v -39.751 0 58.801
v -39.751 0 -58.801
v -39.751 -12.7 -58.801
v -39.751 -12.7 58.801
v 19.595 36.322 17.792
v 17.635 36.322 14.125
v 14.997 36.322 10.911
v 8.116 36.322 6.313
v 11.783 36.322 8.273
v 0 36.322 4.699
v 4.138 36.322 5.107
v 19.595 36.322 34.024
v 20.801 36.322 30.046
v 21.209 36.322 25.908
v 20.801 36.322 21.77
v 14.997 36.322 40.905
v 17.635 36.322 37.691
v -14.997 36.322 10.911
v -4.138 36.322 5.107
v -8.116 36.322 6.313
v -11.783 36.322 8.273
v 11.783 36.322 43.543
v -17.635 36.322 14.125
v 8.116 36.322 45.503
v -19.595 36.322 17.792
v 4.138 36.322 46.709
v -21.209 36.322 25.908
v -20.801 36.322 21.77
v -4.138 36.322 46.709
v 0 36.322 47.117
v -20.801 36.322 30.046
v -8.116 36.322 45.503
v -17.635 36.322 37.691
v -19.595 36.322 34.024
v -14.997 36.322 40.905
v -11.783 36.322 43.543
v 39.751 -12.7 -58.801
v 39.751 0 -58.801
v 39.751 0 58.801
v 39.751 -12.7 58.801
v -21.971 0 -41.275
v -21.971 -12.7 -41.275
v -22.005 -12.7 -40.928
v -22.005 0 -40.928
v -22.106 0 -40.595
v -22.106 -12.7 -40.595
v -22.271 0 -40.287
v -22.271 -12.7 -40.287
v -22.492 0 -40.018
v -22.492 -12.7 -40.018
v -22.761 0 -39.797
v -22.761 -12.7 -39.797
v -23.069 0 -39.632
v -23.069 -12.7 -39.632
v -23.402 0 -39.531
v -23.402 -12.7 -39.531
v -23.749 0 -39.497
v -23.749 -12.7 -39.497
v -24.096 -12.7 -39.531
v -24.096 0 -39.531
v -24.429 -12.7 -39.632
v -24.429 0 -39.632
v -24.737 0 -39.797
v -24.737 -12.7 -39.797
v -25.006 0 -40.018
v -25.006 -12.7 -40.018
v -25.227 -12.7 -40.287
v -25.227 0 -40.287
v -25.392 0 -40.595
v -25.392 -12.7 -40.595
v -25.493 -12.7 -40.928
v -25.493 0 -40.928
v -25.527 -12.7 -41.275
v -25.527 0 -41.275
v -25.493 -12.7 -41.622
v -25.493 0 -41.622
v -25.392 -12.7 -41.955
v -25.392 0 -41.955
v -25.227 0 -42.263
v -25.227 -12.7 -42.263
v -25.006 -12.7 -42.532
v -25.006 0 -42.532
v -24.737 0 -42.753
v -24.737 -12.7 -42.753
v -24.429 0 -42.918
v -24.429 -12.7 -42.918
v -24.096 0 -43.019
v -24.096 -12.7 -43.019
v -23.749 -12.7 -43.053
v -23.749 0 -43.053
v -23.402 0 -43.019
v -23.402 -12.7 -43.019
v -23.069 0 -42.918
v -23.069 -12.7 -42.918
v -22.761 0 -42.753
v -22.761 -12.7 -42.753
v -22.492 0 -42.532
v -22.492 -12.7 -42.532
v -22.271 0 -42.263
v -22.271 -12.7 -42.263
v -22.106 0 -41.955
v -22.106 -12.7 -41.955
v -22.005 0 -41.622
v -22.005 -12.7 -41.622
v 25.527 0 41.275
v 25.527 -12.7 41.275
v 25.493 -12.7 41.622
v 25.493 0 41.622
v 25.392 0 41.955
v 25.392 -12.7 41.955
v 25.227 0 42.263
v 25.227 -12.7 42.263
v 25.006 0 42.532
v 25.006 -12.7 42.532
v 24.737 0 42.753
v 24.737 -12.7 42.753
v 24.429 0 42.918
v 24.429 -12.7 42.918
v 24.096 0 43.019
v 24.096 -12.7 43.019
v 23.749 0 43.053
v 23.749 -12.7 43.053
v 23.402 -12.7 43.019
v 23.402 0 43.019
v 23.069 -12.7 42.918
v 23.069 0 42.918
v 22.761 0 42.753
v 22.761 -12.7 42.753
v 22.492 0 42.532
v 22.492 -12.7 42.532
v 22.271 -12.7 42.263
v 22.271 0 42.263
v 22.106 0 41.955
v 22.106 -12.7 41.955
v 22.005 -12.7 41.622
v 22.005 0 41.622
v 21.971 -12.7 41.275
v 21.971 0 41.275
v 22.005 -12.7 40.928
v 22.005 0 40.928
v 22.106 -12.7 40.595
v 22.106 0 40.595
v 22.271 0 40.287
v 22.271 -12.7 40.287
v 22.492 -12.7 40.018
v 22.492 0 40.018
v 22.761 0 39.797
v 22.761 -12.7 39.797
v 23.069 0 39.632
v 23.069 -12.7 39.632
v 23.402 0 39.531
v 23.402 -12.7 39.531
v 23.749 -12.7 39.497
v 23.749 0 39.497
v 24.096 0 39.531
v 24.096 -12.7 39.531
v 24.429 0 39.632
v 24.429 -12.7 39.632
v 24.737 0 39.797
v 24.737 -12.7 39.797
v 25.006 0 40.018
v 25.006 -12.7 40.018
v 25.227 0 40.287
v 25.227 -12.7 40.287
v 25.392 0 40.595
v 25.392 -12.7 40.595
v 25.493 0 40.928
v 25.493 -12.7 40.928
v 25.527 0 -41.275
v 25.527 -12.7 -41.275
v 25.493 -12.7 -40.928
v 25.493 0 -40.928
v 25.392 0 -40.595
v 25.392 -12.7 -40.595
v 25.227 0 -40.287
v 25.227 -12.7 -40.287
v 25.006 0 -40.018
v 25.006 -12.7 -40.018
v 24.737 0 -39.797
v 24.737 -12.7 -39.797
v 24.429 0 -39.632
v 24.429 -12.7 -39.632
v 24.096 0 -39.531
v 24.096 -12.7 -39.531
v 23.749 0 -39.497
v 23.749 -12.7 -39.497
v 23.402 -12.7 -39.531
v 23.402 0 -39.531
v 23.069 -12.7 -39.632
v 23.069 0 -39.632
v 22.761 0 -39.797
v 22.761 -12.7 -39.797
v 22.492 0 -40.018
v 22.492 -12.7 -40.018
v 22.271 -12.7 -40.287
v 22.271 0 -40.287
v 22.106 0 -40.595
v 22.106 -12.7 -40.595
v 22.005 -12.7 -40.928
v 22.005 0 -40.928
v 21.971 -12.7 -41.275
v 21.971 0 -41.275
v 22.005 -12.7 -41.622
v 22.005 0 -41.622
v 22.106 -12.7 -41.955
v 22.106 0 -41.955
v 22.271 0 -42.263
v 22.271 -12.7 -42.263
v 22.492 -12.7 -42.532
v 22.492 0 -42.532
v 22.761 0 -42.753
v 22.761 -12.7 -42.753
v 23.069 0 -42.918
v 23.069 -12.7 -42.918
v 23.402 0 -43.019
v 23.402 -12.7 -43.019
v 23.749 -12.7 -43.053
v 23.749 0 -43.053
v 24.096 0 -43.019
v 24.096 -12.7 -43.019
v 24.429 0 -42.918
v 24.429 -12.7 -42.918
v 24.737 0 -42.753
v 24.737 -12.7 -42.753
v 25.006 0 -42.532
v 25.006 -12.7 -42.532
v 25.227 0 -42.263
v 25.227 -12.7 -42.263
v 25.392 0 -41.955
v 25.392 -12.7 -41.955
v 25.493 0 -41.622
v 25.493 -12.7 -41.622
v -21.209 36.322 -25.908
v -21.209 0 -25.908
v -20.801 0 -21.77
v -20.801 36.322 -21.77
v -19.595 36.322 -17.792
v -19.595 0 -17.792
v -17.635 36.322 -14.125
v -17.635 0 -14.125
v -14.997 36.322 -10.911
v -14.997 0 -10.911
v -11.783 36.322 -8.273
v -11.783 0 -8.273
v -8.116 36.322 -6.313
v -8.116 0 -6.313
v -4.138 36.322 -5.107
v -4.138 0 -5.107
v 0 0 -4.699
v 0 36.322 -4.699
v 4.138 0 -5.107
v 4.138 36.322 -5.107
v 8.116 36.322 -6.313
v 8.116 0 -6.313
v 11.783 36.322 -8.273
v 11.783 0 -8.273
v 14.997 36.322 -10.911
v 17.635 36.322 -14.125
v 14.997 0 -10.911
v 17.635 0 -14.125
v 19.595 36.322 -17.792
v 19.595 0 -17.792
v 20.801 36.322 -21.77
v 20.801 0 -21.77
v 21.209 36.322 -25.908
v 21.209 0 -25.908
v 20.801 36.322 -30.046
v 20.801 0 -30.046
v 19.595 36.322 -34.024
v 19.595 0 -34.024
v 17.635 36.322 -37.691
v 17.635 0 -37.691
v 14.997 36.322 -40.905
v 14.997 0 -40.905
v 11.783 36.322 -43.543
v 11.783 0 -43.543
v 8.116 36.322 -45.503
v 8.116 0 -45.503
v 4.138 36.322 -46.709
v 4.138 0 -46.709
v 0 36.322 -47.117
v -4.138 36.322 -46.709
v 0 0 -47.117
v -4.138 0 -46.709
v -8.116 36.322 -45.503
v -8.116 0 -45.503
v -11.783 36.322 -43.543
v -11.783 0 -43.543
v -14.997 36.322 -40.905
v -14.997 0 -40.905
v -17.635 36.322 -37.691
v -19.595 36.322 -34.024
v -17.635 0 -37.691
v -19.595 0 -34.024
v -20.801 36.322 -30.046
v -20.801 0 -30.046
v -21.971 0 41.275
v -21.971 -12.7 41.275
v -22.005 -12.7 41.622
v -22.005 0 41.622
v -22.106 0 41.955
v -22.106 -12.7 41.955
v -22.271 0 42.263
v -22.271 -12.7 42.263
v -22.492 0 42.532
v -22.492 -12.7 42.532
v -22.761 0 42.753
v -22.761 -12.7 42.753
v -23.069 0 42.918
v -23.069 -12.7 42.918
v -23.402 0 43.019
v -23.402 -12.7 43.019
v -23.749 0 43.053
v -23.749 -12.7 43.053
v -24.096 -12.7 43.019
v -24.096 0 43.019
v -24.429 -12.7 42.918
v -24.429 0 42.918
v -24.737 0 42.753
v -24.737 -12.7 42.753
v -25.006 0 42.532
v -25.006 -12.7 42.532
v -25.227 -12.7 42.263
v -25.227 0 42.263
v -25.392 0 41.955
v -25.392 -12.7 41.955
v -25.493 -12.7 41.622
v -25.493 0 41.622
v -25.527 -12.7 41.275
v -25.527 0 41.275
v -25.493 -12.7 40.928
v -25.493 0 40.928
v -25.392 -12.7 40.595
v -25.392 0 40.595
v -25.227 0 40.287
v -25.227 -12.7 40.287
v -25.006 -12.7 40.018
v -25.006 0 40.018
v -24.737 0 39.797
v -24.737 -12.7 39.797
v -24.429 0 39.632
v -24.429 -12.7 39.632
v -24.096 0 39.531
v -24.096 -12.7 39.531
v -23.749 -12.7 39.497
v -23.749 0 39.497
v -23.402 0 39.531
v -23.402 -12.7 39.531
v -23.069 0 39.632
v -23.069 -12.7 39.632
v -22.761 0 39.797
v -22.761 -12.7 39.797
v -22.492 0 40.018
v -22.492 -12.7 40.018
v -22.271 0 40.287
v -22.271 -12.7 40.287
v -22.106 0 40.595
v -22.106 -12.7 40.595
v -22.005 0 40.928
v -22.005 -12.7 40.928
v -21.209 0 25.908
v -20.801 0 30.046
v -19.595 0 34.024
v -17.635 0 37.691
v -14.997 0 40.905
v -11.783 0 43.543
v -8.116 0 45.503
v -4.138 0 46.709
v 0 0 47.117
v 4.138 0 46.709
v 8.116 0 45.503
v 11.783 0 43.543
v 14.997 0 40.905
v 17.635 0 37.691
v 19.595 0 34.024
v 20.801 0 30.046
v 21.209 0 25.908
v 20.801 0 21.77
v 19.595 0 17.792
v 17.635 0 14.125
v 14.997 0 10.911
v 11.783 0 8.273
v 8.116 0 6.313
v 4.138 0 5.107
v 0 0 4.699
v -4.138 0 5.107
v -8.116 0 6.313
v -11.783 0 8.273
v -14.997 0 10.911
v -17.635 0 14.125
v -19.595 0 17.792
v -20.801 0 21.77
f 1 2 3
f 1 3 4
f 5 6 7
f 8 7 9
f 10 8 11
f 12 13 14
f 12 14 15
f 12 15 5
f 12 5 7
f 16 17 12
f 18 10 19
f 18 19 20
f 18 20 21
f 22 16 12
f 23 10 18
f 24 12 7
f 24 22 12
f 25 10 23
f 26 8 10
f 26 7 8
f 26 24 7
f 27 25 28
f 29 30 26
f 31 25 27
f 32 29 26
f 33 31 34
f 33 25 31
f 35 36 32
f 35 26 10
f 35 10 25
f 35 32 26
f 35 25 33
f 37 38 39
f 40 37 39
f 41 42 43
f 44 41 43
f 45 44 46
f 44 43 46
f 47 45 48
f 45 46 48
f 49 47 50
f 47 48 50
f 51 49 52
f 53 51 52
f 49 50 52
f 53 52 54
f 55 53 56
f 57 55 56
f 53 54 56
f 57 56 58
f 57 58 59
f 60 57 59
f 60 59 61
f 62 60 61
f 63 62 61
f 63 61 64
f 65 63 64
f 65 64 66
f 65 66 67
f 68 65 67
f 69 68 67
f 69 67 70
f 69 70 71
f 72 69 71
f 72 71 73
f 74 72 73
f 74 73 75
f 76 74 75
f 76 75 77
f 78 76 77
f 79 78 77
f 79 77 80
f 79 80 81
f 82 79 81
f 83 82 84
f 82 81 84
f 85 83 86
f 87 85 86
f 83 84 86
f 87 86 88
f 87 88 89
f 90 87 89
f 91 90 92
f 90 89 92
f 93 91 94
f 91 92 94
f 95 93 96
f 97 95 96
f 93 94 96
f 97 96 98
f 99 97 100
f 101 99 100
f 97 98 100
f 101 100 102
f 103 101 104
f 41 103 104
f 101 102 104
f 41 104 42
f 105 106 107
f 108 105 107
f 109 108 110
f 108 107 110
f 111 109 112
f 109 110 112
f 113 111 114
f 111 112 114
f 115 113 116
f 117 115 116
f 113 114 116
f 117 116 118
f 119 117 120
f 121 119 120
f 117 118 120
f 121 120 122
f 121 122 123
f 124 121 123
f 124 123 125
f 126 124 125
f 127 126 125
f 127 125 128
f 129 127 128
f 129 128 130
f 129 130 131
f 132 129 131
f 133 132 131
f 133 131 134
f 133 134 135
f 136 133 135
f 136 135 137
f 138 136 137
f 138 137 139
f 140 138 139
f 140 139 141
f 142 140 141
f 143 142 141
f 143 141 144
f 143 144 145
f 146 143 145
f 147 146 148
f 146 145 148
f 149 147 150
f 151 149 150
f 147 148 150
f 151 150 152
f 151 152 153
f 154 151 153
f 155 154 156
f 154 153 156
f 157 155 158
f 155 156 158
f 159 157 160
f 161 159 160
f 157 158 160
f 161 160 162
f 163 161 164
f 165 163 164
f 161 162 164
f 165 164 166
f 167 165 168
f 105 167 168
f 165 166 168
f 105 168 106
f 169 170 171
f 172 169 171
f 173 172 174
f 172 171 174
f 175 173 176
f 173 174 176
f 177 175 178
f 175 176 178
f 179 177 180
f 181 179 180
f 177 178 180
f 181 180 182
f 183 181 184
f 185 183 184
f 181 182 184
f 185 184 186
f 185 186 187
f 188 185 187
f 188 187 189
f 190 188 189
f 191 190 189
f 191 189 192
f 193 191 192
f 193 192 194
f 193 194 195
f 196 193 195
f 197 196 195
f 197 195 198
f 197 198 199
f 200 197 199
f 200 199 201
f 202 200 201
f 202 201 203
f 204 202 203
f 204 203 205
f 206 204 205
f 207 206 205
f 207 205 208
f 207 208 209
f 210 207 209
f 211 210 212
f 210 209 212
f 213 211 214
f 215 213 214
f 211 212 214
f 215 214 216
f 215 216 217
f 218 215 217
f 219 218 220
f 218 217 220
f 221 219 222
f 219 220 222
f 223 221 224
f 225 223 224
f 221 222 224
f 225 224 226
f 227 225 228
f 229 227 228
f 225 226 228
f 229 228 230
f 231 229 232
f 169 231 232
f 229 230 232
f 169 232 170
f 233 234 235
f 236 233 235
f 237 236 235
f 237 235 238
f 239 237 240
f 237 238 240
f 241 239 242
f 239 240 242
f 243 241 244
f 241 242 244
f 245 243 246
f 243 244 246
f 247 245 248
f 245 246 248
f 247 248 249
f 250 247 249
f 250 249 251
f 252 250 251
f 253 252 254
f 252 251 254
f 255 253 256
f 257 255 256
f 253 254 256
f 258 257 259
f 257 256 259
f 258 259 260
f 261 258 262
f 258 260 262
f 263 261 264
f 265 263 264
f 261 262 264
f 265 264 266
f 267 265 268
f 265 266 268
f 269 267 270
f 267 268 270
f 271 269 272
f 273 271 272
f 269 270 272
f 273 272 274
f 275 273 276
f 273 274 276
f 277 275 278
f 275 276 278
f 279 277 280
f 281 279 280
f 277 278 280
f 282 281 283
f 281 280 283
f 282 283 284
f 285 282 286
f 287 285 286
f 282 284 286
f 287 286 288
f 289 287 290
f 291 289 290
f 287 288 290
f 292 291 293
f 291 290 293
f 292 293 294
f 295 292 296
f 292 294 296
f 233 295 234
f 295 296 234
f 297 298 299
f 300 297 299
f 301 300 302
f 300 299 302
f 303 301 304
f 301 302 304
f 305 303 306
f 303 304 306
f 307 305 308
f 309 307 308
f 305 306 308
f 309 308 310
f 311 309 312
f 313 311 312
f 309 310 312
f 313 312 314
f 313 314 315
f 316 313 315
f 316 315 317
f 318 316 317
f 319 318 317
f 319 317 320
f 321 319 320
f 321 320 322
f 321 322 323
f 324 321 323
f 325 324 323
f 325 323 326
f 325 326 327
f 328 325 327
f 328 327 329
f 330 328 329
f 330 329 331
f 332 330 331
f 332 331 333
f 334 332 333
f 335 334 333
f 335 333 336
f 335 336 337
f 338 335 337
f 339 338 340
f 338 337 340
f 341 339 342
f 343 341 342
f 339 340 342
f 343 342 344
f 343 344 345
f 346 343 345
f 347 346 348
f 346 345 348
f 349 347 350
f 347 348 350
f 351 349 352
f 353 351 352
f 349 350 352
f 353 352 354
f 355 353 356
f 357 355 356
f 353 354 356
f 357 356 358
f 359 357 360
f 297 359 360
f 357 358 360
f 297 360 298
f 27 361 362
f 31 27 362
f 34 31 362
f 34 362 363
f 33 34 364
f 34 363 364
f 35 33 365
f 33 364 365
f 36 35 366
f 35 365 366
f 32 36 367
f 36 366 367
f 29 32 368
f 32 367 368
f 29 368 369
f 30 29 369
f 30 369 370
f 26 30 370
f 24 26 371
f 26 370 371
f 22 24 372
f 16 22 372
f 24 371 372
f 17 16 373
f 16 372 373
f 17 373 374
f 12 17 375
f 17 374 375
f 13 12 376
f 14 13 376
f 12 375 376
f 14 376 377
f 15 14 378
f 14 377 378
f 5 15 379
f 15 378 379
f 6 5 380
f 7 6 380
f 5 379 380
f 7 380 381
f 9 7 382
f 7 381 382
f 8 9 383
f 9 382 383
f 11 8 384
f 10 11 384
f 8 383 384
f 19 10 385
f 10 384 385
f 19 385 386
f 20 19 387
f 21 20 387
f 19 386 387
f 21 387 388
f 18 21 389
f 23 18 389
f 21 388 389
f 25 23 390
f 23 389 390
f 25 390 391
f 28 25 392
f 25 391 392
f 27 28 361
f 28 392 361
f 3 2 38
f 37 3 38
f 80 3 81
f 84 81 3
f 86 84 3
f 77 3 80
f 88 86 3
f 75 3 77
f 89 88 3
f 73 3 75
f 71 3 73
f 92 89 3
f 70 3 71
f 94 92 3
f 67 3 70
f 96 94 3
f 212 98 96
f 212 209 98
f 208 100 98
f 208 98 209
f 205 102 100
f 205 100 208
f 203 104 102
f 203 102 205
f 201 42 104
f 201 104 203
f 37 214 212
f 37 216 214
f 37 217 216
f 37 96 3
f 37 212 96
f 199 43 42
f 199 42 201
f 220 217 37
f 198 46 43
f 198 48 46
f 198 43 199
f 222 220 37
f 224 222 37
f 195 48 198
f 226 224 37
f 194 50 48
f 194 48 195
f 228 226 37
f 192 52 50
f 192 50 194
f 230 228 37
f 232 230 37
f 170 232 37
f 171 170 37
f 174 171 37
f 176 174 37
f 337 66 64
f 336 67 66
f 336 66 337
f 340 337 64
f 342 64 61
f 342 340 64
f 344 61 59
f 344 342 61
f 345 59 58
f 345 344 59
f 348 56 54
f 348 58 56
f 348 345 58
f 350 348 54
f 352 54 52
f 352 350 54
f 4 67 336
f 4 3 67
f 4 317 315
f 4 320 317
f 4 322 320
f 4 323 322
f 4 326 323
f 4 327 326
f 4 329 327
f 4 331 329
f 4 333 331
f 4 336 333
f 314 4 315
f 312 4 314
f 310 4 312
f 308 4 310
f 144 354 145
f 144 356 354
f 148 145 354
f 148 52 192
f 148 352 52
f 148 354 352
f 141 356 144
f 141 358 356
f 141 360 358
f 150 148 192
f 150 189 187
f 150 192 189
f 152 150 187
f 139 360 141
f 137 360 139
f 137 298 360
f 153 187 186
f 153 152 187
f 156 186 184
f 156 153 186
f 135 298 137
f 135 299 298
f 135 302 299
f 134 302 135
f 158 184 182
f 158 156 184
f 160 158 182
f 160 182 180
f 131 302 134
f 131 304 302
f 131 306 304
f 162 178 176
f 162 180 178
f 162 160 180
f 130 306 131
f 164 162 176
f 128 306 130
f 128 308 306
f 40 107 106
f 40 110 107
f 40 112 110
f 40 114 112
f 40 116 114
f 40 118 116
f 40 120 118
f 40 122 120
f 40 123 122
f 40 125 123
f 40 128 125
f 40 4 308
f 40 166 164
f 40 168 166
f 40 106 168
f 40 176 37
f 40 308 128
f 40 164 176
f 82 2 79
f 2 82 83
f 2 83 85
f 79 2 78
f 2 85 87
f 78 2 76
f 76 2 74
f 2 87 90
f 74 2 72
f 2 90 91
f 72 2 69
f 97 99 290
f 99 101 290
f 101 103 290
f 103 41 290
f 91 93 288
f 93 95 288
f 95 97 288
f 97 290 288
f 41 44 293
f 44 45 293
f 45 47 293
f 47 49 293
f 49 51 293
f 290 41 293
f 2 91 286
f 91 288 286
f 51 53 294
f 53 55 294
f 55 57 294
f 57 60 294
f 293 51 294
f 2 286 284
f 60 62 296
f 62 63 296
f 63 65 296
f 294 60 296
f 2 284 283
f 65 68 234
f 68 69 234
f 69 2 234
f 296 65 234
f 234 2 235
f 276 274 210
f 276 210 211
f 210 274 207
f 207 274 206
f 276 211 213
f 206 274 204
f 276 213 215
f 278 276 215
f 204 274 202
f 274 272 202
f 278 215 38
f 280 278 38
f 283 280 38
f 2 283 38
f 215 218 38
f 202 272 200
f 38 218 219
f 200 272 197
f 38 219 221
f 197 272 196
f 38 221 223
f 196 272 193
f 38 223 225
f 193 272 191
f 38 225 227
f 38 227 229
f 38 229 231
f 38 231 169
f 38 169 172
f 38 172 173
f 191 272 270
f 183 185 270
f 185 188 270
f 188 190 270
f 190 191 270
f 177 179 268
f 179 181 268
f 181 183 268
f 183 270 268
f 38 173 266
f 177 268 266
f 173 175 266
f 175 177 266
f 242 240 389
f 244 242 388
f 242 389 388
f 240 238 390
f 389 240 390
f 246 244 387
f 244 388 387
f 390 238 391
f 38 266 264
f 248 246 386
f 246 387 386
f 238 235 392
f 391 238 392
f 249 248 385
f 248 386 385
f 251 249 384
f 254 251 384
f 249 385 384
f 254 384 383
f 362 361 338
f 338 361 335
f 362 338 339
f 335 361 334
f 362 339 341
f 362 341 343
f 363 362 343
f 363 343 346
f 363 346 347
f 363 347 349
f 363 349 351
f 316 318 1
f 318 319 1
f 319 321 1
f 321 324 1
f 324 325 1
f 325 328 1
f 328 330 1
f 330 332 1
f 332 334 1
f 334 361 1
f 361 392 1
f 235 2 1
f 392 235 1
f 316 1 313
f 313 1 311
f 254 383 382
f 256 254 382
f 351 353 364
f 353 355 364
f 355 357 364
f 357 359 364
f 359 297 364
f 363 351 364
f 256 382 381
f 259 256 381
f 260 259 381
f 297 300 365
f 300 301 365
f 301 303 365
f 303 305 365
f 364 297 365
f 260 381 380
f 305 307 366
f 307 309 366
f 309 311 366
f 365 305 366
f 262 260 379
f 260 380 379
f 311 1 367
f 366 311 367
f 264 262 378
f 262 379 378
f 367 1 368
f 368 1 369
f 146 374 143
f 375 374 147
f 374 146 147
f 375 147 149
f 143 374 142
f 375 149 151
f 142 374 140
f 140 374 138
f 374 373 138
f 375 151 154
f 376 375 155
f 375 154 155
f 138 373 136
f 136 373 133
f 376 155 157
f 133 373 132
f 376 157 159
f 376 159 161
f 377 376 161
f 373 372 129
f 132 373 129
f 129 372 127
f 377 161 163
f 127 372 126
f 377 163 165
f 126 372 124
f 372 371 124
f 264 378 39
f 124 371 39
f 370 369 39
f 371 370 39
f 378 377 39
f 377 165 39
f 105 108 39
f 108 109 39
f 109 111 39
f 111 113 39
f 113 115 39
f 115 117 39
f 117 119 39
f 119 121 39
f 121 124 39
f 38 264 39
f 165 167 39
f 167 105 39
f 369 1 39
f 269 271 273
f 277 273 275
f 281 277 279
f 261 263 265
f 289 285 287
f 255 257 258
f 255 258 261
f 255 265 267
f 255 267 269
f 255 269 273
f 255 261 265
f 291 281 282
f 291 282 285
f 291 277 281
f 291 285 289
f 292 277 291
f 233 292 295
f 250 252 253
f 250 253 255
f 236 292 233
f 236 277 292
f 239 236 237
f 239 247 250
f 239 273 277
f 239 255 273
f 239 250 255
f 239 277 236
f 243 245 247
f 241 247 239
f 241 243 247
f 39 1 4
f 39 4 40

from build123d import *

# Parameters (mm, degrees)
F0_W     = 79.502
F0_H     = 117.602
F1_DEPTH = 12.7
F2_R     = 1.778
F3_DEPTH = 12.701
F4_R     = 21.209
F5_DEPTH = 36.322


with BuildPart() as f1:
    # F0 (on Front) → F1 (new body)
    with BuildSketch(Plane.XZ):
        Rectangle(F0_W, F0_H)
    extrude(amount=F1_DEPTH)

    # F2 (on face) → F3 (cut, through all)
    with BuildSketch(Plane.XZ.offset(12.7)):
        with Locations((-23.749, 41.275)):
            Circle(F2_R)
        with Locations((23.749, 41.275)):
            Circle(F2_R)
        with Locations((-23.749, -41.275)):
            Circle(F2_R)
        with Locations((23.749, -41.275)):
            Circle(F2_R)
    extrude(amount=-F3_DEPTH, mode=Mode.SUBTRACT)

    # F4 (on face) → F5 (join)
    with BuildSketch(Plane(origin=(0, 0, 0), x_dir=(-1, 0, 0), z_dir=(0, 1, 0))):
        with Locations((0, 25.908)):
            Circle(F4_R)
        with Locations((0, -25.908)):
            Circle(F4_R)
    extrude(amount=F5_DEPTH)


solid = f1.part
